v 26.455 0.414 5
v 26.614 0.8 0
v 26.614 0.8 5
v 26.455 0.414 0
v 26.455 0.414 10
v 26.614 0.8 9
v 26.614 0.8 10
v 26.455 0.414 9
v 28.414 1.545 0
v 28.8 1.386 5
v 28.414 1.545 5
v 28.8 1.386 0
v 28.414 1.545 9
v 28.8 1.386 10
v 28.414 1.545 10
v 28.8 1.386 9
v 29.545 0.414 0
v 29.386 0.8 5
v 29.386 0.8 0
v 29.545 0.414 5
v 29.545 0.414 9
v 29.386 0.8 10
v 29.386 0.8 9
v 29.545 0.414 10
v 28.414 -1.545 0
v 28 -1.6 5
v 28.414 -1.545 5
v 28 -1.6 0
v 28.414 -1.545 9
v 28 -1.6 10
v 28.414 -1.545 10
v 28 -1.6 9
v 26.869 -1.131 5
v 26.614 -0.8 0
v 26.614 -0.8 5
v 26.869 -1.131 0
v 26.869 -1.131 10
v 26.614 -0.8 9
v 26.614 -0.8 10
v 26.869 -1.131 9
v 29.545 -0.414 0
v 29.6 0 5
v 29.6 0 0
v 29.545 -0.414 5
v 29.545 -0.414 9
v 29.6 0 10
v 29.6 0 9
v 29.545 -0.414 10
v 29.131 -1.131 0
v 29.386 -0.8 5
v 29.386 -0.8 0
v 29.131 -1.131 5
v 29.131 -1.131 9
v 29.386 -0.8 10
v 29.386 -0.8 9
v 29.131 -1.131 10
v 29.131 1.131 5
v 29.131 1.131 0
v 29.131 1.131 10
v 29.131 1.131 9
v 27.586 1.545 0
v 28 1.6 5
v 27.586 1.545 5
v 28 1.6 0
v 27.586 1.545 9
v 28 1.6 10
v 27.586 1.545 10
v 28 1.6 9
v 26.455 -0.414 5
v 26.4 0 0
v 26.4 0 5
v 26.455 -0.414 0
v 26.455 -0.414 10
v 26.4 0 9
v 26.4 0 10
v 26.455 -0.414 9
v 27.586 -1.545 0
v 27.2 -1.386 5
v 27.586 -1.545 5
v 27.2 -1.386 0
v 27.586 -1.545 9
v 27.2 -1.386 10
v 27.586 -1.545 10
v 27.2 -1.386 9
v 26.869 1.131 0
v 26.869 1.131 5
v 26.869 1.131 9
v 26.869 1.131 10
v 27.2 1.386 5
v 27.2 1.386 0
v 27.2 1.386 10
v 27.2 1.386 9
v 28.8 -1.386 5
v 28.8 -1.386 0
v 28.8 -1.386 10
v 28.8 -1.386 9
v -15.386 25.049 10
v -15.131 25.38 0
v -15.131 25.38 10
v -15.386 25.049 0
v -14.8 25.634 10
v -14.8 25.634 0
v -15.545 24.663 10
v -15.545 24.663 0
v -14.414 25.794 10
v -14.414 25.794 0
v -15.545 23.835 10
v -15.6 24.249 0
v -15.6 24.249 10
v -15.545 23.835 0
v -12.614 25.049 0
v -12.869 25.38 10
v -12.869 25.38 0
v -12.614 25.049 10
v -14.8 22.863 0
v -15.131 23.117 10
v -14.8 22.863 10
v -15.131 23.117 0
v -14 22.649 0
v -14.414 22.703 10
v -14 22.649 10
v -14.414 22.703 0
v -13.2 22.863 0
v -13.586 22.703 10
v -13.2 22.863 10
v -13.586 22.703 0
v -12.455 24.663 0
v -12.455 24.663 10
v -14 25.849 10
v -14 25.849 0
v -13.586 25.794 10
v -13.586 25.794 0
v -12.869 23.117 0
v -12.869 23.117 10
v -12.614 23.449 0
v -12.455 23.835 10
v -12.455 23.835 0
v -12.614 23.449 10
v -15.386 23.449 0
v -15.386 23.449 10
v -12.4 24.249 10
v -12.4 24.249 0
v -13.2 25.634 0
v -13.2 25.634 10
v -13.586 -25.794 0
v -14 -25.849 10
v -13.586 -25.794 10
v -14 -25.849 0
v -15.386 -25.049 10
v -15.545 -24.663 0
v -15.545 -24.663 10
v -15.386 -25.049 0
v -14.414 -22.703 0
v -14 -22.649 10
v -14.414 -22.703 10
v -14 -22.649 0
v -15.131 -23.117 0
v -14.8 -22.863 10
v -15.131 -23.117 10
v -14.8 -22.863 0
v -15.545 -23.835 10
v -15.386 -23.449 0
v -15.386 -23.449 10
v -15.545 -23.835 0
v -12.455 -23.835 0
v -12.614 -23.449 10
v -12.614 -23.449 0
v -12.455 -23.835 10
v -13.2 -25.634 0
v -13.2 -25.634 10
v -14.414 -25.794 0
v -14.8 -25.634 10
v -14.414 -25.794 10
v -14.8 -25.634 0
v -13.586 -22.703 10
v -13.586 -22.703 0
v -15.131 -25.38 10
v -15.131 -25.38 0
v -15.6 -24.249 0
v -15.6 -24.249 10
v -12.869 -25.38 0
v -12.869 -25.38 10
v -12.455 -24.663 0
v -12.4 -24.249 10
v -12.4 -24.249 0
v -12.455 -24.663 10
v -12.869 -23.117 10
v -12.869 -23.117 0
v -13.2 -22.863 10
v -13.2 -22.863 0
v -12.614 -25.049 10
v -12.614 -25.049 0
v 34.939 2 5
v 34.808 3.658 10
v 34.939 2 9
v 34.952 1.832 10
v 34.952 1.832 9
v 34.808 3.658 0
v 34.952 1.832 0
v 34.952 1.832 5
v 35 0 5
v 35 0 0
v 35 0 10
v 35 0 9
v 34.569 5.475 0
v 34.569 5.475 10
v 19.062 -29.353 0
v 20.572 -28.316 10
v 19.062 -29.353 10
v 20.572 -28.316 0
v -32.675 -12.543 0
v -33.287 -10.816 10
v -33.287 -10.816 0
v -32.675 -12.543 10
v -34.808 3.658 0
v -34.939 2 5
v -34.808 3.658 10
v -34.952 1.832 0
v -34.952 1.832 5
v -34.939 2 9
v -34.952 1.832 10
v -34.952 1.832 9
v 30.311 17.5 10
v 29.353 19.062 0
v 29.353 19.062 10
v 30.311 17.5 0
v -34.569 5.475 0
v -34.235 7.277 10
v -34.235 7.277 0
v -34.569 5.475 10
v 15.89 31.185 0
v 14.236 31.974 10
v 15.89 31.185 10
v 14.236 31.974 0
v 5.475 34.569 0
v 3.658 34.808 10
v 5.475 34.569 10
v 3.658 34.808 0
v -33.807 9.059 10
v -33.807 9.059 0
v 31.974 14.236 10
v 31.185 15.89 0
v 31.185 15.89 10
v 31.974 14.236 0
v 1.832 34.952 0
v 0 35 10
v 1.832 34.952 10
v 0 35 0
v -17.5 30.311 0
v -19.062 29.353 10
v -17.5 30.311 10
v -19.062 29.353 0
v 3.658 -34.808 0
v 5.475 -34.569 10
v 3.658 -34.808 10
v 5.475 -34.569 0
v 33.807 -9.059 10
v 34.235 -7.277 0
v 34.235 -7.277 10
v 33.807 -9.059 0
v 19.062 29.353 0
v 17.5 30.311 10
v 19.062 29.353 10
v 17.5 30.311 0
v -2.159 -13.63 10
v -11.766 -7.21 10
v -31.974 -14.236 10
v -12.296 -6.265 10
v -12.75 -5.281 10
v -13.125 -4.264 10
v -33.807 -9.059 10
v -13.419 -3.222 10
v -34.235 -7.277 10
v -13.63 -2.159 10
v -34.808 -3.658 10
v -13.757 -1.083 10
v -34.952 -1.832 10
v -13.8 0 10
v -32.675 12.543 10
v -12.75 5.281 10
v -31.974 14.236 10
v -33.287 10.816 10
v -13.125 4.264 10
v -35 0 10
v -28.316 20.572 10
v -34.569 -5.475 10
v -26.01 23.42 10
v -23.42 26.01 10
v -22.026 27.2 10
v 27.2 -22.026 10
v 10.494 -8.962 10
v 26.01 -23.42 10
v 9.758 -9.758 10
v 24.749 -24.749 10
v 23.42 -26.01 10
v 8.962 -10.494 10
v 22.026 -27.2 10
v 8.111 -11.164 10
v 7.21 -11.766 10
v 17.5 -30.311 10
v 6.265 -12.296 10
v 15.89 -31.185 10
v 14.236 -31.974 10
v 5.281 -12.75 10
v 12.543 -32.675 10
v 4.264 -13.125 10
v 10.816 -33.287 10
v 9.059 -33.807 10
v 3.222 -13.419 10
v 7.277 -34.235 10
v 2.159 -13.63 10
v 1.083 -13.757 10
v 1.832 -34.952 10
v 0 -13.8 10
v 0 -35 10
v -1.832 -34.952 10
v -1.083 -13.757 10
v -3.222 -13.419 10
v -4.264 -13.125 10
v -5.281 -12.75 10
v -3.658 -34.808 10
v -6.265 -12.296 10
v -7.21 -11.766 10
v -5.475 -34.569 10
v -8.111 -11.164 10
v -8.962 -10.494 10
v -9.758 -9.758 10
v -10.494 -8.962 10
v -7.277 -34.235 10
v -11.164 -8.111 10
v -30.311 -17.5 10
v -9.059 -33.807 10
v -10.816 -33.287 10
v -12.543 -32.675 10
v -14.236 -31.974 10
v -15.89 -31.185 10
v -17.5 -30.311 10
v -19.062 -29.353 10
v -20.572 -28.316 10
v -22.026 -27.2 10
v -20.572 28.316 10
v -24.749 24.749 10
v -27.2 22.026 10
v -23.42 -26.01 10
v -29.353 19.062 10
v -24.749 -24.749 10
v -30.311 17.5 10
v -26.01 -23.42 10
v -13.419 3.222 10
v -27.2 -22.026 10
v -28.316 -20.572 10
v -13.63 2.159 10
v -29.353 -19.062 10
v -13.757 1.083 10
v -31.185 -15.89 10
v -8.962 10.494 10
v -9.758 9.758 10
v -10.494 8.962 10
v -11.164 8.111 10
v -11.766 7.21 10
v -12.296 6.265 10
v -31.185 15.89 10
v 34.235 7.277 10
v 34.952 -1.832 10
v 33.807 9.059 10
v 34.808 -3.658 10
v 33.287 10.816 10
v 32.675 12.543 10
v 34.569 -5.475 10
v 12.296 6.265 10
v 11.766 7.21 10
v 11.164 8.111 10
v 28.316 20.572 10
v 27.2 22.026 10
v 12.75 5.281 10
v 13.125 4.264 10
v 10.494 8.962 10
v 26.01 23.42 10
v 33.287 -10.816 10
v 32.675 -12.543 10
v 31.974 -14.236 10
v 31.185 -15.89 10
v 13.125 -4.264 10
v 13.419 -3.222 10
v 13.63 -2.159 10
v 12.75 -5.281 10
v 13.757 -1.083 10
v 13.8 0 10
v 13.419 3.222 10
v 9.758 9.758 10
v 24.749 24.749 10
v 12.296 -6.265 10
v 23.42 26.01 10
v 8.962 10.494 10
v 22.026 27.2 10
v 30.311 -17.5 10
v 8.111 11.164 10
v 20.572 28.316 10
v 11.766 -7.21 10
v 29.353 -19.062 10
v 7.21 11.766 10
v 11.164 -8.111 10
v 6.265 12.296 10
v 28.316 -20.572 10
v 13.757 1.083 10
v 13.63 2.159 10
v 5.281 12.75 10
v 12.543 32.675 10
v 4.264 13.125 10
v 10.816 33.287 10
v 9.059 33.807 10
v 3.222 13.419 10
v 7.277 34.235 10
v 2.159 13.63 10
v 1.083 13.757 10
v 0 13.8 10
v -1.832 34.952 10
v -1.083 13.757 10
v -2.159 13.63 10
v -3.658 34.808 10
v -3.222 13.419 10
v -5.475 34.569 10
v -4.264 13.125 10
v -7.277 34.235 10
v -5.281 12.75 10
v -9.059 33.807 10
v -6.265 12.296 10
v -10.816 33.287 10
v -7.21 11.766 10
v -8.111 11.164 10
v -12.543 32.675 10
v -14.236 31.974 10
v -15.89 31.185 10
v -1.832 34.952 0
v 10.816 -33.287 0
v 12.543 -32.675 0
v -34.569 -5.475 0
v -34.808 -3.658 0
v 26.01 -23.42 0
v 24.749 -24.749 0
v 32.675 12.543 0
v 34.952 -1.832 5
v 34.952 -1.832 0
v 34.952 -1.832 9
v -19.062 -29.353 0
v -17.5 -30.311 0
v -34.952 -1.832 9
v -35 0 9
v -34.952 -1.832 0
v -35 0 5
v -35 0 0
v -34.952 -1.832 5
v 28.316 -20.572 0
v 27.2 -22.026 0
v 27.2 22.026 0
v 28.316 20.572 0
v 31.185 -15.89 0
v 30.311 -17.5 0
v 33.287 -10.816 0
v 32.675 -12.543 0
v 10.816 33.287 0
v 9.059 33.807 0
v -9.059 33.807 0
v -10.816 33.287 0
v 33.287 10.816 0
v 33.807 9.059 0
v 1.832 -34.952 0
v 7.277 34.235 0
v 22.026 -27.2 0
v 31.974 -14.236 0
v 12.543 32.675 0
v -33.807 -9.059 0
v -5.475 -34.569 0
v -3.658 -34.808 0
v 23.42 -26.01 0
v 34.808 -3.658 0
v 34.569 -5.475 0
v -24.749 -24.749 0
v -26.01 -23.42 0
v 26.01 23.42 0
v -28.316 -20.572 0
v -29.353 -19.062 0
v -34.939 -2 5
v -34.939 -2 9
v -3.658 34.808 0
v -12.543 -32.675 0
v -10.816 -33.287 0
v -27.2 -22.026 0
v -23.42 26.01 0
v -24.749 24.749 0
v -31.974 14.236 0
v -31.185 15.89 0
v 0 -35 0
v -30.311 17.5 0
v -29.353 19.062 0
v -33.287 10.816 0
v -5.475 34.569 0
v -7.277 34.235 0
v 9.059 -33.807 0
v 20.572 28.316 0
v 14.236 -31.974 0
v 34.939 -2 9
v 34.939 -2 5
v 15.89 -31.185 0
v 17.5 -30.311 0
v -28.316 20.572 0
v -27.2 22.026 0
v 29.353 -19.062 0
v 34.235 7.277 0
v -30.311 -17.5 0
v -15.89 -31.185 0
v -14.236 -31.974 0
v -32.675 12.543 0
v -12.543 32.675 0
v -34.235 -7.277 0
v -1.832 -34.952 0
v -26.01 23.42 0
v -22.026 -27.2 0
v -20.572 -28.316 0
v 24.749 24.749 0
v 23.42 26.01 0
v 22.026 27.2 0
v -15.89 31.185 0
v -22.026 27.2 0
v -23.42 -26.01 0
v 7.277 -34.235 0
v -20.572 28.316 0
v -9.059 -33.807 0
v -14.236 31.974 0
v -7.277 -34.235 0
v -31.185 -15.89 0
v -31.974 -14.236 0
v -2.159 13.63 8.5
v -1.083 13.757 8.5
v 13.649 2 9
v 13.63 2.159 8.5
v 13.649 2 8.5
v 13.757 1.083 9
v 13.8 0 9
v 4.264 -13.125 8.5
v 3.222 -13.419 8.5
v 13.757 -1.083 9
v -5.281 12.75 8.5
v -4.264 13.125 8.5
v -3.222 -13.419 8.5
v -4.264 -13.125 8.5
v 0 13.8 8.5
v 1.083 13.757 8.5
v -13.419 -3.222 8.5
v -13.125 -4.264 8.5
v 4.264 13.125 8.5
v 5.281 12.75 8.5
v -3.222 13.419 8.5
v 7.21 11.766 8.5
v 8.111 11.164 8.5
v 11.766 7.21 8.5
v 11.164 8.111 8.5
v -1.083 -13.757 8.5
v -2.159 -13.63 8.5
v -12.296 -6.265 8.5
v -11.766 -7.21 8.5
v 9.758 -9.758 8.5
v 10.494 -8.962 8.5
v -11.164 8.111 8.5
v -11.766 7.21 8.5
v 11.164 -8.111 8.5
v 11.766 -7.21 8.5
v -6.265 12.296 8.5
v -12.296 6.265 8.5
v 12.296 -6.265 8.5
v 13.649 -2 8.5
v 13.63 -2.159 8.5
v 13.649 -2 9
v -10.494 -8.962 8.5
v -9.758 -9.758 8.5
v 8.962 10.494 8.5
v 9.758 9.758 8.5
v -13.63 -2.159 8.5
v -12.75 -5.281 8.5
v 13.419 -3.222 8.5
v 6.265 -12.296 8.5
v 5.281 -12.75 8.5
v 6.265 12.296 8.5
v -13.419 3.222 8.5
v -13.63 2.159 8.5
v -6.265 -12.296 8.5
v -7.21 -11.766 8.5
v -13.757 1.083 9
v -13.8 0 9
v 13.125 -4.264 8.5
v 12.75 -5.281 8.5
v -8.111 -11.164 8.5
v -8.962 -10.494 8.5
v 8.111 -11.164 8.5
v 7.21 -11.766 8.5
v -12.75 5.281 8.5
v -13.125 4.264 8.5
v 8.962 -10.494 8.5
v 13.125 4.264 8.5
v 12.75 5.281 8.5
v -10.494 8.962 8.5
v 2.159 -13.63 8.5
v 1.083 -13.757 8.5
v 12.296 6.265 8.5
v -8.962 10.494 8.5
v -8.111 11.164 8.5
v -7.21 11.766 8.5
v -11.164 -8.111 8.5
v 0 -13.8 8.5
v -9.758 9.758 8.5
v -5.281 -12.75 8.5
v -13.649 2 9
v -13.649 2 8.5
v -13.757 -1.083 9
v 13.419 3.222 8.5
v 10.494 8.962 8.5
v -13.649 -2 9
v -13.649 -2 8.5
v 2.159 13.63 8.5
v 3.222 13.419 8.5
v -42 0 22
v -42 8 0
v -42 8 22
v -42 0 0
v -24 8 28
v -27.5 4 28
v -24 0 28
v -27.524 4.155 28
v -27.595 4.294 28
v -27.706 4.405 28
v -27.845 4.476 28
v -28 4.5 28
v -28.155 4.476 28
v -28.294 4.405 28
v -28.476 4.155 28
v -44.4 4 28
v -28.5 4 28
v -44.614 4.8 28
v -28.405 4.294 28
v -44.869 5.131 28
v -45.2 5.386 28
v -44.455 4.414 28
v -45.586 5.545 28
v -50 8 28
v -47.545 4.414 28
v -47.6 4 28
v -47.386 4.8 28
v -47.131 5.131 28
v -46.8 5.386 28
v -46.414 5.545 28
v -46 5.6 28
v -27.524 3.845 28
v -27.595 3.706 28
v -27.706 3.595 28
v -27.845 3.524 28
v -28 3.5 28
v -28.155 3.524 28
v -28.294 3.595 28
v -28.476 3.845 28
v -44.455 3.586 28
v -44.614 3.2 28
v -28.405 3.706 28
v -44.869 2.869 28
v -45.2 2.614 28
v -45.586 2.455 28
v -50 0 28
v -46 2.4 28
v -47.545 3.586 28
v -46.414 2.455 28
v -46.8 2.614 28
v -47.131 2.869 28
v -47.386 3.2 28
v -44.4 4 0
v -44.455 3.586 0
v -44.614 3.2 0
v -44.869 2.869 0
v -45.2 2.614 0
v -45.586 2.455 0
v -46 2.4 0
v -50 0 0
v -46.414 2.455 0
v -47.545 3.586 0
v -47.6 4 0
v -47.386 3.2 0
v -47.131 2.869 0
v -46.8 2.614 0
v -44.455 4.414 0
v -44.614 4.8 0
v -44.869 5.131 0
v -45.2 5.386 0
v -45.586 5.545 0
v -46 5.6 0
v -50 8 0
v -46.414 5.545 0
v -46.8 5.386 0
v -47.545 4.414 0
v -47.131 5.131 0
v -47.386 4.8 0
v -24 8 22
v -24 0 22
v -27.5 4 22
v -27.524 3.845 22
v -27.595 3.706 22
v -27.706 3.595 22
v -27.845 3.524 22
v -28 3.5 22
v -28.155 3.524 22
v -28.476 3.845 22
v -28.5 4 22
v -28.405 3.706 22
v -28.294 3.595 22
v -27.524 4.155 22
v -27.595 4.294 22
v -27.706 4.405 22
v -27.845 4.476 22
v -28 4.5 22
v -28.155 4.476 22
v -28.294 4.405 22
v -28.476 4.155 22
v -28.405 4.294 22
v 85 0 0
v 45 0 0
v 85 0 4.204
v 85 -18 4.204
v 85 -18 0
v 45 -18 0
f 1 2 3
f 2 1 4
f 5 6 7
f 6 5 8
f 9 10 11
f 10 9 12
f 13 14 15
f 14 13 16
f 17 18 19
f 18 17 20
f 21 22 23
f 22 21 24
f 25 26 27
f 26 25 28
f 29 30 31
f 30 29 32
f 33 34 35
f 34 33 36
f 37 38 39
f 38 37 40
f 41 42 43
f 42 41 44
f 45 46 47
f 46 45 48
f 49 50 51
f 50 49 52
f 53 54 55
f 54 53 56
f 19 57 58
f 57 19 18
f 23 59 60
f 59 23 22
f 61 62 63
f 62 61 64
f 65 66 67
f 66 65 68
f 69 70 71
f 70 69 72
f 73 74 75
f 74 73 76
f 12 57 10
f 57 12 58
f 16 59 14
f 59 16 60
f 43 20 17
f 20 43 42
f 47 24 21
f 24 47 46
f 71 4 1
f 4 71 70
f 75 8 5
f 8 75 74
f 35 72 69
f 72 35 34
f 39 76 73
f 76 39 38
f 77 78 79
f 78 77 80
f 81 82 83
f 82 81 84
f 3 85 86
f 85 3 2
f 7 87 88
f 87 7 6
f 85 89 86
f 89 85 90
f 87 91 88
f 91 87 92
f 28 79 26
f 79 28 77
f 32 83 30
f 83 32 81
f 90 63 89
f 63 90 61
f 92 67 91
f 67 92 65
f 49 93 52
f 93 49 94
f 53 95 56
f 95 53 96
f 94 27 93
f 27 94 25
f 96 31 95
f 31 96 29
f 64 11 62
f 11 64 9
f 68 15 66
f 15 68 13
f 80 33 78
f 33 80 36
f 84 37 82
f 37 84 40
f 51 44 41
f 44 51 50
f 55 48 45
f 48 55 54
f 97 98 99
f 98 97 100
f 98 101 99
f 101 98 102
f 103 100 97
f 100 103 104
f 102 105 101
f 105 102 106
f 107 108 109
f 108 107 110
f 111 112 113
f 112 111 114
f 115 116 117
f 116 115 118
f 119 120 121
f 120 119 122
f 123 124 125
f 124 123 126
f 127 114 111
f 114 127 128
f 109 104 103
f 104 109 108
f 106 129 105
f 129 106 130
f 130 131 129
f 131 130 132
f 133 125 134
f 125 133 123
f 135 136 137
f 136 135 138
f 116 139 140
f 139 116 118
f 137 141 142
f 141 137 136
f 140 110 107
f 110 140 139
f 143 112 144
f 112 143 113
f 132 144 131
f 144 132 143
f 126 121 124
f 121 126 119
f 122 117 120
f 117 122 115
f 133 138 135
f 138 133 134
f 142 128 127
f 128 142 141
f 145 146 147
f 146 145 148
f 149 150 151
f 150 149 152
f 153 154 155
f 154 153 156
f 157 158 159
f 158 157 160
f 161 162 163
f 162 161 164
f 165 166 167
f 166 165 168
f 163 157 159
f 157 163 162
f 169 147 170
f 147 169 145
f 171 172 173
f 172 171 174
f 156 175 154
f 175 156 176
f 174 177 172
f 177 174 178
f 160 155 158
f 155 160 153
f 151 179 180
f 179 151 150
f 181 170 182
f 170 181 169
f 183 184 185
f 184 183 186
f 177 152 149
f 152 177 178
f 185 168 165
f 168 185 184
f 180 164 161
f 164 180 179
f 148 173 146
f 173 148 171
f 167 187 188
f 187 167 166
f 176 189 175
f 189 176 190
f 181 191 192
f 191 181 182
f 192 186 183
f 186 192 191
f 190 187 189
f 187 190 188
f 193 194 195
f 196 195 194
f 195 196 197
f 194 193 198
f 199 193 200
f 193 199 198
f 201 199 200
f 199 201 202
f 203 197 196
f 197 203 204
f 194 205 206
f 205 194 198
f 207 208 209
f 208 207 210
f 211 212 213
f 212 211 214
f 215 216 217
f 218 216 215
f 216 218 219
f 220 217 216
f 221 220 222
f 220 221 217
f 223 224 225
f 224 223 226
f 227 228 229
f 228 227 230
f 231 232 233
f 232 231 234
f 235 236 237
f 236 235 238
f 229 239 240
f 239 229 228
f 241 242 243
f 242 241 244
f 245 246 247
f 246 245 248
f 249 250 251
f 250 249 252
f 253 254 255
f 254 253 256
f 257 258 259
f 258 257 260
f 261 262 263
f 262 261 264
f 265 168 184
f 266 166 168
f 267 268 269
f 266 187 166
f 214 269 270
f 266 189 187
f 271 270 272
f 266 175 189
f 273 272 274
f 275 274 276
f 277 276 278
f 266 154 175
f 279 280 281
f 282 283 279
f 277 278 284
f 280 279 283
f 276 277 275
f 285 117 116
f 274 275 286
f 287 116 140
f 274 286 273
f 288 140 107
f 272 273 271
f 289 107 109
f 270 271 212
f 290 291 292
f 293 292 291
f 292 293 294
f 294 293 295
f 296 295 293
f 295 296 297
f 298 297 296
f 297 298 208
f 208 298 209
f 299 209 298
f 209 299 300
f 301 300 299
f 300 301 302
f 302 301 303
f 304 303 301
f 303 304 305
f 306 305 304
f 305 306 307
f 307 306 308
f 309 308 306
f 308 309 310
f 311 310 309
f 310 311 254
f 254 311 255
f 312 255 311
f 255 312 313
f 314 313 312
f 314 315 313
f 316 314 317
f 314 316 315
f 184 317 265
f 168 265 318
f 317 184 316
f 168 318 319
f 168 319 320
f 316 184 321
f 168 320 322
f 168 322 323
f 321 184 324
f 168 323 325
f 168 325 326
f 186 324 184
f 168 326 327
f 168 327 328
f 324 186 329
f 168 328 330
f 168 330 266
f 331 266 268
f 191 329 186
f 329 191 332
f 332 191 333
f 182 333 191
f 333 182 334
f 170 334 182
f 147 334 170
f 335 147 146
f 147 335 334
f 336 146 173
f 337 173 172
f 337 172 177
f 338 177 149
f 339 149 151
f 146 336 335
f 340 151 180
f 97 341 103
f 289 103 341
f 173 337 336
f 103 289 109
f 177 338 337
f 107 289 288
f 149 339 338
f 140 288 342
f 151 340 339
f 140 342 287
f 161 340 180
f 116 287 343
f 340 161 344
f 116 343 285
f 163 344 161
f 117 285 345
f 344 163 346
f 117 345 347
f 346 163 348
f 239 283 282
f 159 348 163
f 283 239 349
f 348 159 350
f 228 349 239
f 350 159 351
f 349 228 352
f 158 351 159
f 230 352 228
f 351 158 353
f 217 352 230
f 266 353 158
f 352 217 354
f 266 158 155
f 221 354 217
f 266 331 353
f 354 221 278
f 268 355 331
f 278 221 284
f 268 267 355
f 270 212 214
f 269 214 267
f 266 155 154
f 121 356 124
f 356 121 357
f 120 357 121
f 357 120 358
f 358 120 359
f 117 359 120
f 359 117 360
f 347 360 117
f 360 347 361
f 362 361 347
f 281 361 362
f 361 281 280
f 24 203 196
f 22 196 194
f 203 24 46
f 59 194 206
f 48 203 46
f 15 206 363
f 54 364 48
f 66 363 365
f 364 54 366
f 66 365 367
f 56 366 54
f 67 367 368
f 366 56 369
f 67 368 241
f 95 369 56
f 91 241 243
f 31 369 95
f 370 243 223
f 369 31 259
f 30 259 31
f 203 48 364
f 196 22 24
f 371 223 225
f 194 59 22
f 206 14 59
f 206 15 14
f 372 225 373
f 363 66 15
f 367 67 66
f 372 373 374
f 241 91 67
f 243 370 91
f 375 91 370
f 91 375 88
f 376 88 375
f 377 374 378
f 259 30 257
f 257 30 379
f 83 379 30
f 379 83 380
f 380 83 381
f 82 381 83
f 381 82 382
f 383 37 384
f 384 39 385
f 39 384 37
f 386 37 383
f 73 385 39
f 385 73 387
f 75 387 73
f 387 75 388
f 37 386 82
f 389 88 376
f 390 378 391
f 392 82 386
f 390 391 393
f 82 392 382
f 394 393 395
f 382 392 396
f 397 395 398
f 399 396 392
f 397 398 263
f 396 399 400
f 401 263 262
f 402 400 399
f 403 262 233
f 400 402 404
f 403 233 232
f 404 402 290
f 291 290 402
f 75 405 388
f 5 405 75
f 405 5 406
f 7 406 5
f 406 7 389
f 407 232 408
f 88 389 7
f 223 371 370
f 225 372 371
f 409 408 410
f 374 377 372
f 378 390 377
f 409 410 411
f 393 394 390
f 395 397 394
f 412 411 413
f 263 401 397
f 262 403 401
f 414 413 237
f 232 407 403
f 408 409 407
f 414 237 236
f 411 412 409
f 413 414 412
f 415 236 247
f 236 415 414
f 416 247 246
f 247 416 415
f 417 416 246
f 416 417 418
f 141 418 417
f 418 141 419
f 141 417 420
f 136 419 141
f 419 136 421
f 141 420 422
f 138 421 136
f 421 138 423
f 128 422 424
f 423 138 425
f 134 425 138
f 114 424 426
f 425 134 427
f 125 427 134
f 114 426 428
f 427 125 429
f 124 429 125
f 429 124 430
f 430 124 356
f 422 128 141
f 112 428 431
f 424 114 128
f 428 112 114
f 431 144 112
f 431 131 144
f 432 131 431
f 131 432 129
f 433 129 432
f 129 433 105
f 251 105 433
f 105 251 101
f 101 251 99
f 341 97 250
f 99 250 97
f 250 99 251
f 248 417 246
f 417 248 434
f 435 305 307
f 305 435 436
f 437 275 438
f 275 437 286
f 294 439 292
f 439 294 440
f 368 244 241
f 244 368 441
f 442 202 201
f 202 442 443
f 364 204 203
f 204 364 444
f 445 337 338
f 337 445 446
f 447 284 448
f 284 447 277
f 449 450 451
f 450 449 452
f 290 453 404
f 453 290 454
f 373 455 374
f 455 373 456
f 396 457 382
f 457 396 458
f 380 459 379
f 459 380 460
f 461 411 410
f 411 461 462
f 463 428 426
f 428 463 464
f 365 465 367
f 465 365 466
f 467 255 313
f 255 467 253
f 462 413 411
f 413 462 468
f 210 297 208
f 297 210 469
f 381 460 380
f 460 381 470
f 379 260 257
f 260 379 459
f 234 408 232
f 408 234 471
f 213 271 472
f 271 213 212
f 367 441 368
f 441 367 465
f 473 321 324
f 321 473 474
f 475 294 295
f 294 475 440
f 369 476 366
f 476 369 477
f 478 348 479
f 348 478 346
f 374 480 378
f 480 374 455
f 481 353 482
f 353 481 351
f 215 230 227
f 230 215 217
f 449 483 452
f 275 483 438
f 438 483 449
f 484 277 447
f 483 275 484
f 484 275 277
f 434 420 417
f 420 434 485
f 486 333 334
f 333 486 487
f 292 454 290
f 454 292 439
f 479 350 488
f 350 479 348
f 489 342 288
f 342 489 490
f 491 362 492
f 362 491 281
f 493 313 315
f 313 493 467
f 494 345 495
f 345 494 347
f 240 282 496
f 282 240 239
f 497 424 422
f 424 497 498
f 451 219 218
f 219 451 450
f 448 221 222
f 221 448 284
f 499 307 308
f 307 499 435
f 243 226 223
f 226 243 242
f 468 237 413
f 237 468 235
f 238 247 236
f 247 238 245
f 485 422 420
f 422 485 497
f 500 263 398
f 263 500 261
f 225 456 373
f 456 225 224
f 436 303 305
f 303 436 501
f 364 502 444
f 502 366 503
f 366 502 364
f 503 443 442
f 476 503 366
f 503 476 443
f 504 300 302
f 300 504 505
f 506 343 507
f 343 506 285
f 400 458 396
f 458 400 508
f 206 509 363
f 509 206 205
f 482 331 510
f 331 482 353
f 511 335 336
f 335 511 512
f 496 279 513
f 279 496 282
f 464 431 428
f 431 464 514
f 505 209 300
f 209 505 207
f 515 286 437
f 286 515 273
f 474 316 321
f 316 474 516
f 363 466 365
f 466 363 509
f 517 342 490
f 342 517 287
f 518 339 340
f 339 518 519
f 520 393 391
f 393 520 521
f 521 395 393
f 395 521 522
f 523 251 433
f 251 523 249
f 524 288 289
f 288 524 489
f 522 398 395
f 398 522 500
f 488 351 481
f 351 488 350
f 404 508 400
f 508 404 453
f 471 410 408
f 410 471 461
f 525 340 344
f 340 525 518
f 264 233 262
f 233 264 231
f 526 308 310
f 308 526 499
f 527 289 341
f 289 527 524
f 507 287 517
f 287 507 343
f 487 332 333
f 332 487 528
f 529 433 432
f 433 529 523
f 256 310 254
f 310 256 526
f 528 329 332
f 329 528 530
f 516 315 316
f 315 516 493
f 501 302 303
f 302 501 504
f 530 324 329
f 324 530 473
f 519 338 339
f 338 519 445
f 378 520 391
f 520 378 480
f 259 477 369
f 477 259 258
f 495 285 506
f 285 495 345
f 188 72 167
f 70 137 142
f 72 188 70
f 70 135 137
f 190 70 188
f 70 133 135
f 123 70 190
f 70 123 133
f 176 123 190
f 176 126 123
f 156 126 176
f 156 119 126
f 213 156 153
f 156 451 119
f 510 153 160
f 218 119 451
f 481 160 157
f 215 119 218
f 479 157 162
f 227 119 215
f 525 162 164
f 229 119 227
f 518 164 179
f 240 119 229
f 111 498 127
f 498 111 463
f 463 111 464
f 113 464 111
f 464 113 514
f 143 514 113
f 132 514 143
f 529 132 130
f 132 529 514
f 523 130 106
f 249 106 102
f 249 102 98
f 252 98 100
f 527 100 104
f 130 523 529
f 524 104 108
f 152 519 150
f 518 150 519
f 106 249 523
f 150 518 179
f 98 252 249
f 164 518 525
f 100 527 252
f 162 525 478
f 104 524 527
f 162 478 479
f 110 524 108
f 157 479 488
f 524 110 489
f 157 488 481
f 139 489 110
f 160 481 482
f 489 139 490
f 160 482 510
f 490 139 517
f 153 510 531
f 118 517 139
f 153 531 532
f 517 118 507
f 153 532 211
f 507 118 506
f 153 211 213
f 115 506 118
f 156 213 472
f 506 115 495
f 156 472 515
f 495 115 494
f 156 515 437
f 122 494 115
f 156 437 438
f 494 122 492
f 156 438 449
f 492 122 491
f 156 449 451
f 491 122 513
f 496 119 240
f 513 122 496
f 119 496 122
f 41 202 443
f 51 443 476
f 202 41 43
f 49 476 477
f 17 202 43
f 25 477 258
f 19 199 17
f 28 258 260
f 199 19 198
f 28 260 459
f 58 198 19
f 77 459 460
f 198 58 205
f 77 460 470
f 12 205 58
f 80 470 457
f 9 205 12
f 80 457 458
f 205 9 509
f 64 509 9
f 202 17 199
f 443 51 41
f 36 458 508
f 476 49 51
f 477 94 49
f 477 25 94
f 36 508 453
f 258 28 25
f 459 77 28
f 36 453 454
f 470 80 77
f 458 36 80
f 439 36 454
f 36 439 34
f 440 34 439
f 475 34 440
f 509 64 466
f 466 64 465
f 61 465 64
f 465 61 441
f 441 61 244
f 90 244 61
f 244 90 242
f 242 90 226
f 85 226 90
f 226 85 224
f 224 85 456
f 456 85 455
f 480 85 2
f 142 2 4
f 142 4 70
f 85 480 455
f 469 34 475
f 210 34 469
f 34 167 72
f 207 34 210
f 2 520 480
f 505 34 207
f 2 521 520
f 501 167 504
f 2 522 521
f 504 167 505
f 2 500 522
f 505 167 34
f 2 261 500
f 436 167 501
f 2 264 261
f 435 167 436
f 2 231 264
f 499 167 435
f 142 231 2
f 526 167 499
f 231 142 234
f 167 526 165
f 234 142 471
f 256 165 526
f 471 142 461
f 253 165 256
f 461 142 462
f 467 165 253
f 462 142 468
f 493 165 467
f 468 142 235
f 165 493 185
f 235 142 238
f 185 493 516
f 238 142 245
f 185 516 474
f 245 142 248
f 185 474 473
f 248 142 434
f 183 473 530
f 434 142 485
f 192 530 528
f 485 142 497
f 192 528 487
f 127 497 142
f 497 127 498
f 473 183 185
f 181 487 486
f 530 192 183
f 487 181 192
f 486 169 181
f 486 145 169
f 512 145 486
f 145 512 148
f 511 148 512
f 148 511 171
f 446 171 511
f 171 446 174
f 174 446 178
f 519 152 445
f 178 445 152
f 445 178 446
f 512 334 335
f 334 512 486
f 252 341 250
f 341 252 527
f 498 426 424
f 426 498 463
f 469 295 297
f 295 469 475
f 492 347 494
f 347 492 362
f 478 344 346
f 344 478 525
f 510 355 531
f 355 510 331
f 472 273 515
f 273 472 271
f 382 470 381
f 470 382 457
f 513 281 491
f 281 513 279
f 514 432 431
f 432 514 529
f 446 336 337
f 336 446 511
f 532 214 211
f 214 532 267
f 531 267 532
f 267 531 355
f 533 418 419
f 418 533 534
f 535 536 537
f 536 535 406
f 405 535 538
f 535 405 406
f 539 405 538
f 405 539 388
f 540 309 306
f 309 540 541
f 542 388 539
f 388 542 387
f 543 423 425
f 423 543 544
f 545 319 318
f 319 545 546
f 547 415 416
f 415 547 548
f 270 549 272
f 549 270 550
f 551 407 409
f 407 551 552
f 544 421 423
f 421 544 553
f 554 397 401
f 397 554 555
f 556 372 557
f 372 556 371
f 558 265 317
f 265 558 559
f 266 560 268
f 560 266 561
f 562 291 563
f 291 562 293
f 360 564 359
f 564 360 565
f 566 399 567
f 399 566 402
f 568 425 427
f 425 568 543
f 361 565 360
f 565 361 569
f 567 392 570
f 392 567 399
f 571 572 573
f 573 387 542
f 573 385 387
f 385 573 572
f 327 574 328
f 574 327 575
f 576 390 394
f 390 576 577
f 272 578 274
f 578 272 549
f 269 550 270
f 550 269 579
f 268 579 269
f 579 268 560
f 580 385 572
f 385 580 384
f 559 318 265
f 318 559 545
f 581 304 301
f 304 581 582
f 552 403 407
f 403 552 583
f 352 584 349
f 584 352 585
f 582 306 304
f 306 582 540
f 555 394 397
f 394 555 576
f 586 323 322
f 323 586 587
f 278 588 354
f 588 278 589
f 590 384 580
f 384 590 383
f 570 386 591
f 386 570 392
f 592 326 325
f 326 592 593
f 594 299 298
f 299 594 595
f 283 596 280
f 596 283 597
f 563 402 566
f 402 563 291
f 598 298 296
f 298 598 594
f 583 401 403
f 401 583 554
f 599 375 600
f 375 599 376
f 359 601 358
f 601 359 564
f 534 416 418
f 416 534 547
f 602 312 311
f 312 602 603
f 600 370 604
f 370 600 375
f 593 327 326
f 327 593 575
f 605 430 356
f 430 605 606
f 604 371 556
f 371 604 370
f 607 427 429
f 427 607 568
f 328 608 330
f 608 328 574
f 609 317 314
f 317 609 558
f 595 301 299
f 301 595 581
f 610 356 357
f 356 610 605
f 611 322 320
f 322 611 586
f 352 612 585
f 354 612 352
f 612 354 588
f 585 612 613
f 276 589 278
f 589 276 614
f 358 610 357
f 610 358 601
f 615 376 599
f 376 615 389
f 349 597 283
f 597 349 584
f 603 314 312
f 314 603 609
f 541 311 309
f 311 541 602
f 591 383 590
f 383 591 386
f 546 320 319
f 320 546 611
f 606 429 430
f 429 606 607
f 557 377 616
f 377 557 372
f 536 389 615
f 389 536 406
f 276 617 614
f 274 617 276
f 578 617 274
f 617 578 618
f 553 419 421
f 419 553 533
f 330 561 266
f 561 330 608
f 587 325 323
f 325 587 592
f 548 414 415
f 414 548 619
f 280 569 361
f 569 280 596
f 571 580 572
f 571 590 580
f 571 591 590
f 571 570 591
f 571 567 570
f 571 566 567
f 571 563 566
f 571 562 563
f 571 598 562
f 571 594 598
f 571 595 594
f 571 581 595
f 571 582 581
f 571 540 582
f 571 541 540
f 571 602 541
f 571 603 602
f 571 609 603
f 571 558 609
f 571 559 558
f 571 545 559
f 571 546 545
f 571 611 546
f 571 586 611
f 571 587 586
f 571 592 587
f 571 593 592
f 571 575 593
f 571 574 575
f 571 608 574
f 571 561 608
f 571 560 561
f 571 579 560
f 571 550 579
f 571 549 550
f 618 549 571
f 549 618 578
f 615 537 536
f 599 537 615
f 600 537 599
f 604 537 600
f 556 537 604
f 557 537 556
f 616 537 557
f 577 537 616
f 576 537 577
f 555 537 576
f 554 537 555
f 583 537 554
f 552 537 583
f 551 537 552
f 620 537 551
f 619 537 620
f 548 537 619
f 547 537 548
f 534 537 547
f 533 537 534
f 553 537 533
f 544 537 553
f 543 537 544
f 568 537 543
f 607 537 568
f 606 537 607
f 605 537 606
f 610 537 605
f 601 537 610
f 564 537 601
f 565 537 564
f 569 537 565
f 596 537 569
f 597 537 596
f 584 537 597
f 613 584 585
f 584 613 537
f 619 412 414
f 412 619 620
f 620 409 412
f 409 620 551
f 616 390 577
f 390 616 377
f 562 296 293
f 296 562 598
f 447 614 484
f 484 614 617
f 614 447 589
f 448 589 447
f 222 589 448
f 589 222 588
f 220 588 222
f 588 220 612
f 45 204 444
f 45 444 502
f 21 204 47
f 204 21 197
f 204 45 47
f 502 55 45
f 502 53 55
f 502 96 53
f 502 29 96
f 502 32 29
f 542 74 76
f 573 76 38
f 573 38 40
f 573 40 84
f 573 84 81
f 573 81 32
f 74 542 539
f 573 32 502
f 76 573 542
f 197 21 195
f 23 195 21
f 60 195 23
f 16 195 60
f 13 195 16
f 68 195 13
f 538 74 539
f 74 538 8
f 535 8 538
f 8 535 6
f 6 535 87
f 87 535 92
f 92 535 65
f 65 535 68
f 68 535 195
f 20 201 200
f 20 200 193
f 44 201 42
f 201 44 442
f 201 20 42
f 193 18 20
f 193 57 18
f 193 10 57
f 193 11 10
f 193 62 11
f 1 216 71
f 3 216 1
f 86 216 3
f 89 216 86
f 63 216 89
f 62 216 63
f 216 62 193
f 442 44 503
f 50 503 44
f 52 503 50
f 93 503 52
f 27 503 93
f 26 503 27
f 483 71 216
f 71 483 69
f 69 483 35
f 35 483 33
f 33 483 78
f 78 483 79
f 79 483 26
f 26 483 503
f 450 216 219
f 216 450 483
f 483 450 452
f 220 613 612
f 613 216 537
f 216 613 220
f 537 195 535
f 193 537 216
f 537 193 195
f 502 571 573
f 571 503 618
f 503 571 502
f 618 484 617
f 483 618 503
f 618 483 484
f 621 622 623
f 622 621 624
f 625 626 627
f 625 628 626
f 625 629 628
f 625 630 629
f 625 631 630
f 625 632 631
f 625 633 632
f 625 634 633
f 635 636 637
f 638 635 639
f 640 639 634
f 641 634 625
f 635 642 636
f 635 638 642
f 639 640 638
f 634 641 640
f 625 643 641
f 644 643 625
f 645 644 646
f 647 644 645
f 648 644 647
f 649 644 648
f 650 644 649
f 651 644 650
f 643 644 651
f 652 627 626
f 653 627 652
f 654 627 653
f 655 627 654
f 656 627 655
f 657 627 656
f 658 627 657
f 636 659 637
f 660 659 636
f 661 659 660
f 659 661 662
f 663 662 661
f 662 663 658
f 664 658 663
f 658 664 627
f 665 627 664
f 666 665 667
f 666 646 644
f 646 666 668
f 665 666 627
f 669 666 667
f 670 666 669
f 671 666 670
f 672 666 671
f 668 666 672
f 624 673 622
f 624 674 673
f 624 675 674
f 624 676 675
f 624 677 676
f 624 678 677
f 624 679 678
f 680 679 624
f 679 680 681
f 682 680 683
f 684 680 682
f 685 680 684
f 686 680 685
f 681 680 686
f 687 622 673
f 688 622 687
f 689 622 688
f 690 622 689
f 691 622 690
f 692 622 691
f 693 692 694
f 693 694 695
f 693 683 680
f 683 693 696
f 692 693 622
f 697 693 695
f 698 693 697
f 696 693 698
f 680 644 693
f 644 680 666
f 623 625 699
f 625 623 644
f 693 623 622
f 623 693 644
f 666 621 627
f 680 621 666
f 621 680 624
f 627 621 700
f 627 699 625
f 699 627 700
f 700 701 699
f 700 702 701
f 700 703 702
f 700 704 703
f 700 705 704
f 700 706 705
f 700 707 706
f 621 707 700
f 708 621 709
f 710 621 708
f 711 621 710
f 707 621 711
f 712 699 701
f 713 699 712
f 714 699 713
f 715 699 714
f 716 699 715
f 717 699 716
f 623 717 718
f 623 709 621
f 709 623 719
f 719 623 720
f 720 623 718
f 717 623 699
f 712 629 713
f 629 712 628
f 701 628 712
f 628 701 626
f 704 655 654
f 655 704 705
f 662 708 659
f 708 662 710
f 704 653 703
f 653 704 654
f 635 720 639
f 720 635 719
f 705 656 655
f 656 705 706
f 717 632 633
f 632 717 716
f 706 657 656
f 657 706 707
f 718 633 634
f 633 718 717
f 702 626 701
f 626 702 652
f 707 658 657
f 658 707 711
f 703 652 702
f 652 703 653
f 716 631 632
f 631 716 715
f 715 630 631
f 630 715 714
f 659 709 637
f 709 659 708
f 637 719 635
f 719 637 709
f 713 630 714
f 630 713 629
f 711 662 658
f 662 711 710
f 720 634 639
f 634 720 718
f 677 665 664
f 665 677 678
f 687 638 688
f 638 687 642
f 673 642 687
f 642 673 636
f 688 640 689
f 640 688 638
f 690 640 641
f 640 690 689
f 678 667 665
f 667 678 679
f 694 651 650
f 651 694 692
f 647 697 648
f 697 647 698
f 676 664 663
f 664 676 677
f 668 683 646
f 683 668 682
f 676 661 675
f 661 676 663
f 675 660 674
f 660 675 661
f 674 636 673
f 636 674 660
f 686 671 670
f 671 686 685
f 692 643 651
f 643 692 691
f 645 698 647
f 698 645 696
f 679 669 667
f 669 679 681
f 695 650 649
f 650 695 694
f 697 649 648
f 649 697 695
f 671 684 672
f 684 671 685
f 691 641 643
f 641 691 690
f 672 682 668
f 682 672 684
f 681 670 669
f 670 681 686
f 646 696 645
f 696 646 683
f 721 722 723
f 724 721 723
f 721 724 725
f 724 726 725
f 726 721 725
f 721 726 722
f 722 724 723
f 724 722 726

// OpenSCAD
// Molecular Synth v0 - parametric DIY STM scanner mount (OPTIONAL track)
// =======================================================================
// Atomic-resolution capability demonstrator after Dan Berard's open-source STM:
// a piezo buzzer disk is the XYZ scanner, a hand-cut Pt/Ir wire is the tip, a
// transimpedance amplifier reads the ~nA tunnelling current, a Teensy/Arduino
// runs the feedback. A hobby STM reliably resolves the atomic lattice of HOPG
// graphite - it is NOT a direct imager of soft, hydrated DNA origami (use the gel
// for routine origami QC). See docs/research/04-verification-gel-stm.md.
//
// This prints the rigid base + magnetic coarse-approach ramp that the inchworm /
// screw advance pushes the sample toward the tip. Dimensions in mm; print rigid
// (PETG/ASA) and add mass (steel plate) for vibration isolation.
//
//   openscad -D part=\"base\" -o base.stl stm_mount.scad   // part = base|ramp|tip_holder|all

/* [Geometry] */
base_d      = 70;
base_h      = 10;
piezo_d     = 27;   // 27 mm piezo buzzer disk
piezo_pocket= 1.5;
ramp_angle  = 6;    // shallow coarse-approach incline
tip_arm_h   = 28;

part = "all";

module base() {
    difference() {
        cylinder(h = base_h, d = base_d, $fn=120);
        // piezo scanner pocket (center)
        translate([0,0,base_h - piezo_pocket])
            cylinder(h = piezo_pocket + 1, d = piezo_d + 0.6, $fn=80);
        // wire routing slot
        translate([0,0,base_h-3]) cube([base_d, 4, 4], center=true);
        // three M3 isolation-foot holes
        for (a = [0:120:240])
            rotate([0,0,a]) translate([base_d/2 - 7, 0, -1])
                cylinder(h = base_h + 2, d = 3.2, $fn=24);
    }
}

// Shallow coarse-approach wedge: the sample slides down it toward the tip.
module ramp() {
    l = 40; w = 18; h = l * tan(ramp_angle);
    rotate([90,0,0])
        linear_extrude(height = w)
            polygon([[0,0],[l,0],[l,h]]);
}

module tip_holder() {
    // arm that clamps the Pt/Ir tip over the piezo center
    difference() {
        union() {
            cube([8, 8, tip_arm_h]);
            translate([0,0,tip_arm_h-6]) cube([26, 8, 6]);
        }
        // tip channel (vertical) at the far end, over scanner center
        translate([22, 4, tip_arm_h-7]) cylinder(h=8, d=1.0, $fn=20);
        // mounting hole
        translate([4,4,-1]) cylinder(h=tip_arm_h+2, d=3.2, $fn=24);
    }
}

if (part == "base" || part == "all") base();
if (part == "ramp" || part == "all") translate([base_d/2+10,0,0]) ramp();
if (part == "tip_holder" || part == "all") translate([-base_d/2-15,0,0]) tip_holder();
